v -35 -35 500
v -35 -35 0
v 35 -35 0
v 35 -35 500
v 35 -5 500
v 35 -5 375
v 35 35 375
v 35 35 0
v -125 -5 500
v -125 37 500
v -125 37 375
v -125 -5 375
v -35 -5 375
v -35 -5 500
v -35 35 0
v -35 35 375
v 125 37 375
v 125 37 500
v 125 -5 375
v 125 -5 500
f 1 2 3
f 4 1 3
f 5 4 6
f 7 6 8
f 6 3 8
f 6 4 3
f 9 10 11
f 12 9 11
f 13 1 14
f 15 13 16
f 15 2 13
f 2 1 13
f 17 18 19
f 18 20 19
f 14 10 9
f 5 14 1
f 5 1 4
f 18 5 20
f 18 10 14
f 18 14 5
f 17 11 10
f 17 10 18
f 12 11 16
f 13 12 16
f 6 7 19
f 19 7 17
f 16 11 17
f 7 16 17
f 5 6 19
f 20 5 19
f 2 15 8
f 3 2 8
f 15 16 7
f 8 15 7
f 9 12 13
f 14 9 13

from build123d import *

# Parameters (mm, degrees)
SKETCH1_W                = 70
SKETCH1_H                = 70
BOSS_EXTRUDE1_DEPTH      = 500
SKETCH2_W                = 250
SKETCH2_H                = 125
BOSS_EXTRUDE2_DEPTH      = 2
BOSS_EXTRUDE2_DEPTH_BACK = 40


with BuildPart() as part:
    # Sketch1 → Boss-Extrude1 (new body)
    with BuildSketch(Plane.XY):
        Rectangle(SKETCH1_W, SKETCH1_H)
    extrude(amount=BOSS_EXTRUDE1_DEPTH)

    # Sketch2 → Boss-Extrude2 (add, two sides)
    with BuildSketch(Plane(origin=(0, 35, 0), x_dir=(1, 0, 0), z_dir=(0, 1, 0))) as boss_extrude2_sk:
        with Locations((0, -437.5)):
            Rectangle(SKETCH2_W, SKETCH2_H)
    extrude(amount=BOSS_EXTRUDE2_DEPTH)
    extrude(boss_extrude2_sk.sketch, amount=-BOSS_EXTRUDE2_DEPTH_BACK)


solid = part.part
